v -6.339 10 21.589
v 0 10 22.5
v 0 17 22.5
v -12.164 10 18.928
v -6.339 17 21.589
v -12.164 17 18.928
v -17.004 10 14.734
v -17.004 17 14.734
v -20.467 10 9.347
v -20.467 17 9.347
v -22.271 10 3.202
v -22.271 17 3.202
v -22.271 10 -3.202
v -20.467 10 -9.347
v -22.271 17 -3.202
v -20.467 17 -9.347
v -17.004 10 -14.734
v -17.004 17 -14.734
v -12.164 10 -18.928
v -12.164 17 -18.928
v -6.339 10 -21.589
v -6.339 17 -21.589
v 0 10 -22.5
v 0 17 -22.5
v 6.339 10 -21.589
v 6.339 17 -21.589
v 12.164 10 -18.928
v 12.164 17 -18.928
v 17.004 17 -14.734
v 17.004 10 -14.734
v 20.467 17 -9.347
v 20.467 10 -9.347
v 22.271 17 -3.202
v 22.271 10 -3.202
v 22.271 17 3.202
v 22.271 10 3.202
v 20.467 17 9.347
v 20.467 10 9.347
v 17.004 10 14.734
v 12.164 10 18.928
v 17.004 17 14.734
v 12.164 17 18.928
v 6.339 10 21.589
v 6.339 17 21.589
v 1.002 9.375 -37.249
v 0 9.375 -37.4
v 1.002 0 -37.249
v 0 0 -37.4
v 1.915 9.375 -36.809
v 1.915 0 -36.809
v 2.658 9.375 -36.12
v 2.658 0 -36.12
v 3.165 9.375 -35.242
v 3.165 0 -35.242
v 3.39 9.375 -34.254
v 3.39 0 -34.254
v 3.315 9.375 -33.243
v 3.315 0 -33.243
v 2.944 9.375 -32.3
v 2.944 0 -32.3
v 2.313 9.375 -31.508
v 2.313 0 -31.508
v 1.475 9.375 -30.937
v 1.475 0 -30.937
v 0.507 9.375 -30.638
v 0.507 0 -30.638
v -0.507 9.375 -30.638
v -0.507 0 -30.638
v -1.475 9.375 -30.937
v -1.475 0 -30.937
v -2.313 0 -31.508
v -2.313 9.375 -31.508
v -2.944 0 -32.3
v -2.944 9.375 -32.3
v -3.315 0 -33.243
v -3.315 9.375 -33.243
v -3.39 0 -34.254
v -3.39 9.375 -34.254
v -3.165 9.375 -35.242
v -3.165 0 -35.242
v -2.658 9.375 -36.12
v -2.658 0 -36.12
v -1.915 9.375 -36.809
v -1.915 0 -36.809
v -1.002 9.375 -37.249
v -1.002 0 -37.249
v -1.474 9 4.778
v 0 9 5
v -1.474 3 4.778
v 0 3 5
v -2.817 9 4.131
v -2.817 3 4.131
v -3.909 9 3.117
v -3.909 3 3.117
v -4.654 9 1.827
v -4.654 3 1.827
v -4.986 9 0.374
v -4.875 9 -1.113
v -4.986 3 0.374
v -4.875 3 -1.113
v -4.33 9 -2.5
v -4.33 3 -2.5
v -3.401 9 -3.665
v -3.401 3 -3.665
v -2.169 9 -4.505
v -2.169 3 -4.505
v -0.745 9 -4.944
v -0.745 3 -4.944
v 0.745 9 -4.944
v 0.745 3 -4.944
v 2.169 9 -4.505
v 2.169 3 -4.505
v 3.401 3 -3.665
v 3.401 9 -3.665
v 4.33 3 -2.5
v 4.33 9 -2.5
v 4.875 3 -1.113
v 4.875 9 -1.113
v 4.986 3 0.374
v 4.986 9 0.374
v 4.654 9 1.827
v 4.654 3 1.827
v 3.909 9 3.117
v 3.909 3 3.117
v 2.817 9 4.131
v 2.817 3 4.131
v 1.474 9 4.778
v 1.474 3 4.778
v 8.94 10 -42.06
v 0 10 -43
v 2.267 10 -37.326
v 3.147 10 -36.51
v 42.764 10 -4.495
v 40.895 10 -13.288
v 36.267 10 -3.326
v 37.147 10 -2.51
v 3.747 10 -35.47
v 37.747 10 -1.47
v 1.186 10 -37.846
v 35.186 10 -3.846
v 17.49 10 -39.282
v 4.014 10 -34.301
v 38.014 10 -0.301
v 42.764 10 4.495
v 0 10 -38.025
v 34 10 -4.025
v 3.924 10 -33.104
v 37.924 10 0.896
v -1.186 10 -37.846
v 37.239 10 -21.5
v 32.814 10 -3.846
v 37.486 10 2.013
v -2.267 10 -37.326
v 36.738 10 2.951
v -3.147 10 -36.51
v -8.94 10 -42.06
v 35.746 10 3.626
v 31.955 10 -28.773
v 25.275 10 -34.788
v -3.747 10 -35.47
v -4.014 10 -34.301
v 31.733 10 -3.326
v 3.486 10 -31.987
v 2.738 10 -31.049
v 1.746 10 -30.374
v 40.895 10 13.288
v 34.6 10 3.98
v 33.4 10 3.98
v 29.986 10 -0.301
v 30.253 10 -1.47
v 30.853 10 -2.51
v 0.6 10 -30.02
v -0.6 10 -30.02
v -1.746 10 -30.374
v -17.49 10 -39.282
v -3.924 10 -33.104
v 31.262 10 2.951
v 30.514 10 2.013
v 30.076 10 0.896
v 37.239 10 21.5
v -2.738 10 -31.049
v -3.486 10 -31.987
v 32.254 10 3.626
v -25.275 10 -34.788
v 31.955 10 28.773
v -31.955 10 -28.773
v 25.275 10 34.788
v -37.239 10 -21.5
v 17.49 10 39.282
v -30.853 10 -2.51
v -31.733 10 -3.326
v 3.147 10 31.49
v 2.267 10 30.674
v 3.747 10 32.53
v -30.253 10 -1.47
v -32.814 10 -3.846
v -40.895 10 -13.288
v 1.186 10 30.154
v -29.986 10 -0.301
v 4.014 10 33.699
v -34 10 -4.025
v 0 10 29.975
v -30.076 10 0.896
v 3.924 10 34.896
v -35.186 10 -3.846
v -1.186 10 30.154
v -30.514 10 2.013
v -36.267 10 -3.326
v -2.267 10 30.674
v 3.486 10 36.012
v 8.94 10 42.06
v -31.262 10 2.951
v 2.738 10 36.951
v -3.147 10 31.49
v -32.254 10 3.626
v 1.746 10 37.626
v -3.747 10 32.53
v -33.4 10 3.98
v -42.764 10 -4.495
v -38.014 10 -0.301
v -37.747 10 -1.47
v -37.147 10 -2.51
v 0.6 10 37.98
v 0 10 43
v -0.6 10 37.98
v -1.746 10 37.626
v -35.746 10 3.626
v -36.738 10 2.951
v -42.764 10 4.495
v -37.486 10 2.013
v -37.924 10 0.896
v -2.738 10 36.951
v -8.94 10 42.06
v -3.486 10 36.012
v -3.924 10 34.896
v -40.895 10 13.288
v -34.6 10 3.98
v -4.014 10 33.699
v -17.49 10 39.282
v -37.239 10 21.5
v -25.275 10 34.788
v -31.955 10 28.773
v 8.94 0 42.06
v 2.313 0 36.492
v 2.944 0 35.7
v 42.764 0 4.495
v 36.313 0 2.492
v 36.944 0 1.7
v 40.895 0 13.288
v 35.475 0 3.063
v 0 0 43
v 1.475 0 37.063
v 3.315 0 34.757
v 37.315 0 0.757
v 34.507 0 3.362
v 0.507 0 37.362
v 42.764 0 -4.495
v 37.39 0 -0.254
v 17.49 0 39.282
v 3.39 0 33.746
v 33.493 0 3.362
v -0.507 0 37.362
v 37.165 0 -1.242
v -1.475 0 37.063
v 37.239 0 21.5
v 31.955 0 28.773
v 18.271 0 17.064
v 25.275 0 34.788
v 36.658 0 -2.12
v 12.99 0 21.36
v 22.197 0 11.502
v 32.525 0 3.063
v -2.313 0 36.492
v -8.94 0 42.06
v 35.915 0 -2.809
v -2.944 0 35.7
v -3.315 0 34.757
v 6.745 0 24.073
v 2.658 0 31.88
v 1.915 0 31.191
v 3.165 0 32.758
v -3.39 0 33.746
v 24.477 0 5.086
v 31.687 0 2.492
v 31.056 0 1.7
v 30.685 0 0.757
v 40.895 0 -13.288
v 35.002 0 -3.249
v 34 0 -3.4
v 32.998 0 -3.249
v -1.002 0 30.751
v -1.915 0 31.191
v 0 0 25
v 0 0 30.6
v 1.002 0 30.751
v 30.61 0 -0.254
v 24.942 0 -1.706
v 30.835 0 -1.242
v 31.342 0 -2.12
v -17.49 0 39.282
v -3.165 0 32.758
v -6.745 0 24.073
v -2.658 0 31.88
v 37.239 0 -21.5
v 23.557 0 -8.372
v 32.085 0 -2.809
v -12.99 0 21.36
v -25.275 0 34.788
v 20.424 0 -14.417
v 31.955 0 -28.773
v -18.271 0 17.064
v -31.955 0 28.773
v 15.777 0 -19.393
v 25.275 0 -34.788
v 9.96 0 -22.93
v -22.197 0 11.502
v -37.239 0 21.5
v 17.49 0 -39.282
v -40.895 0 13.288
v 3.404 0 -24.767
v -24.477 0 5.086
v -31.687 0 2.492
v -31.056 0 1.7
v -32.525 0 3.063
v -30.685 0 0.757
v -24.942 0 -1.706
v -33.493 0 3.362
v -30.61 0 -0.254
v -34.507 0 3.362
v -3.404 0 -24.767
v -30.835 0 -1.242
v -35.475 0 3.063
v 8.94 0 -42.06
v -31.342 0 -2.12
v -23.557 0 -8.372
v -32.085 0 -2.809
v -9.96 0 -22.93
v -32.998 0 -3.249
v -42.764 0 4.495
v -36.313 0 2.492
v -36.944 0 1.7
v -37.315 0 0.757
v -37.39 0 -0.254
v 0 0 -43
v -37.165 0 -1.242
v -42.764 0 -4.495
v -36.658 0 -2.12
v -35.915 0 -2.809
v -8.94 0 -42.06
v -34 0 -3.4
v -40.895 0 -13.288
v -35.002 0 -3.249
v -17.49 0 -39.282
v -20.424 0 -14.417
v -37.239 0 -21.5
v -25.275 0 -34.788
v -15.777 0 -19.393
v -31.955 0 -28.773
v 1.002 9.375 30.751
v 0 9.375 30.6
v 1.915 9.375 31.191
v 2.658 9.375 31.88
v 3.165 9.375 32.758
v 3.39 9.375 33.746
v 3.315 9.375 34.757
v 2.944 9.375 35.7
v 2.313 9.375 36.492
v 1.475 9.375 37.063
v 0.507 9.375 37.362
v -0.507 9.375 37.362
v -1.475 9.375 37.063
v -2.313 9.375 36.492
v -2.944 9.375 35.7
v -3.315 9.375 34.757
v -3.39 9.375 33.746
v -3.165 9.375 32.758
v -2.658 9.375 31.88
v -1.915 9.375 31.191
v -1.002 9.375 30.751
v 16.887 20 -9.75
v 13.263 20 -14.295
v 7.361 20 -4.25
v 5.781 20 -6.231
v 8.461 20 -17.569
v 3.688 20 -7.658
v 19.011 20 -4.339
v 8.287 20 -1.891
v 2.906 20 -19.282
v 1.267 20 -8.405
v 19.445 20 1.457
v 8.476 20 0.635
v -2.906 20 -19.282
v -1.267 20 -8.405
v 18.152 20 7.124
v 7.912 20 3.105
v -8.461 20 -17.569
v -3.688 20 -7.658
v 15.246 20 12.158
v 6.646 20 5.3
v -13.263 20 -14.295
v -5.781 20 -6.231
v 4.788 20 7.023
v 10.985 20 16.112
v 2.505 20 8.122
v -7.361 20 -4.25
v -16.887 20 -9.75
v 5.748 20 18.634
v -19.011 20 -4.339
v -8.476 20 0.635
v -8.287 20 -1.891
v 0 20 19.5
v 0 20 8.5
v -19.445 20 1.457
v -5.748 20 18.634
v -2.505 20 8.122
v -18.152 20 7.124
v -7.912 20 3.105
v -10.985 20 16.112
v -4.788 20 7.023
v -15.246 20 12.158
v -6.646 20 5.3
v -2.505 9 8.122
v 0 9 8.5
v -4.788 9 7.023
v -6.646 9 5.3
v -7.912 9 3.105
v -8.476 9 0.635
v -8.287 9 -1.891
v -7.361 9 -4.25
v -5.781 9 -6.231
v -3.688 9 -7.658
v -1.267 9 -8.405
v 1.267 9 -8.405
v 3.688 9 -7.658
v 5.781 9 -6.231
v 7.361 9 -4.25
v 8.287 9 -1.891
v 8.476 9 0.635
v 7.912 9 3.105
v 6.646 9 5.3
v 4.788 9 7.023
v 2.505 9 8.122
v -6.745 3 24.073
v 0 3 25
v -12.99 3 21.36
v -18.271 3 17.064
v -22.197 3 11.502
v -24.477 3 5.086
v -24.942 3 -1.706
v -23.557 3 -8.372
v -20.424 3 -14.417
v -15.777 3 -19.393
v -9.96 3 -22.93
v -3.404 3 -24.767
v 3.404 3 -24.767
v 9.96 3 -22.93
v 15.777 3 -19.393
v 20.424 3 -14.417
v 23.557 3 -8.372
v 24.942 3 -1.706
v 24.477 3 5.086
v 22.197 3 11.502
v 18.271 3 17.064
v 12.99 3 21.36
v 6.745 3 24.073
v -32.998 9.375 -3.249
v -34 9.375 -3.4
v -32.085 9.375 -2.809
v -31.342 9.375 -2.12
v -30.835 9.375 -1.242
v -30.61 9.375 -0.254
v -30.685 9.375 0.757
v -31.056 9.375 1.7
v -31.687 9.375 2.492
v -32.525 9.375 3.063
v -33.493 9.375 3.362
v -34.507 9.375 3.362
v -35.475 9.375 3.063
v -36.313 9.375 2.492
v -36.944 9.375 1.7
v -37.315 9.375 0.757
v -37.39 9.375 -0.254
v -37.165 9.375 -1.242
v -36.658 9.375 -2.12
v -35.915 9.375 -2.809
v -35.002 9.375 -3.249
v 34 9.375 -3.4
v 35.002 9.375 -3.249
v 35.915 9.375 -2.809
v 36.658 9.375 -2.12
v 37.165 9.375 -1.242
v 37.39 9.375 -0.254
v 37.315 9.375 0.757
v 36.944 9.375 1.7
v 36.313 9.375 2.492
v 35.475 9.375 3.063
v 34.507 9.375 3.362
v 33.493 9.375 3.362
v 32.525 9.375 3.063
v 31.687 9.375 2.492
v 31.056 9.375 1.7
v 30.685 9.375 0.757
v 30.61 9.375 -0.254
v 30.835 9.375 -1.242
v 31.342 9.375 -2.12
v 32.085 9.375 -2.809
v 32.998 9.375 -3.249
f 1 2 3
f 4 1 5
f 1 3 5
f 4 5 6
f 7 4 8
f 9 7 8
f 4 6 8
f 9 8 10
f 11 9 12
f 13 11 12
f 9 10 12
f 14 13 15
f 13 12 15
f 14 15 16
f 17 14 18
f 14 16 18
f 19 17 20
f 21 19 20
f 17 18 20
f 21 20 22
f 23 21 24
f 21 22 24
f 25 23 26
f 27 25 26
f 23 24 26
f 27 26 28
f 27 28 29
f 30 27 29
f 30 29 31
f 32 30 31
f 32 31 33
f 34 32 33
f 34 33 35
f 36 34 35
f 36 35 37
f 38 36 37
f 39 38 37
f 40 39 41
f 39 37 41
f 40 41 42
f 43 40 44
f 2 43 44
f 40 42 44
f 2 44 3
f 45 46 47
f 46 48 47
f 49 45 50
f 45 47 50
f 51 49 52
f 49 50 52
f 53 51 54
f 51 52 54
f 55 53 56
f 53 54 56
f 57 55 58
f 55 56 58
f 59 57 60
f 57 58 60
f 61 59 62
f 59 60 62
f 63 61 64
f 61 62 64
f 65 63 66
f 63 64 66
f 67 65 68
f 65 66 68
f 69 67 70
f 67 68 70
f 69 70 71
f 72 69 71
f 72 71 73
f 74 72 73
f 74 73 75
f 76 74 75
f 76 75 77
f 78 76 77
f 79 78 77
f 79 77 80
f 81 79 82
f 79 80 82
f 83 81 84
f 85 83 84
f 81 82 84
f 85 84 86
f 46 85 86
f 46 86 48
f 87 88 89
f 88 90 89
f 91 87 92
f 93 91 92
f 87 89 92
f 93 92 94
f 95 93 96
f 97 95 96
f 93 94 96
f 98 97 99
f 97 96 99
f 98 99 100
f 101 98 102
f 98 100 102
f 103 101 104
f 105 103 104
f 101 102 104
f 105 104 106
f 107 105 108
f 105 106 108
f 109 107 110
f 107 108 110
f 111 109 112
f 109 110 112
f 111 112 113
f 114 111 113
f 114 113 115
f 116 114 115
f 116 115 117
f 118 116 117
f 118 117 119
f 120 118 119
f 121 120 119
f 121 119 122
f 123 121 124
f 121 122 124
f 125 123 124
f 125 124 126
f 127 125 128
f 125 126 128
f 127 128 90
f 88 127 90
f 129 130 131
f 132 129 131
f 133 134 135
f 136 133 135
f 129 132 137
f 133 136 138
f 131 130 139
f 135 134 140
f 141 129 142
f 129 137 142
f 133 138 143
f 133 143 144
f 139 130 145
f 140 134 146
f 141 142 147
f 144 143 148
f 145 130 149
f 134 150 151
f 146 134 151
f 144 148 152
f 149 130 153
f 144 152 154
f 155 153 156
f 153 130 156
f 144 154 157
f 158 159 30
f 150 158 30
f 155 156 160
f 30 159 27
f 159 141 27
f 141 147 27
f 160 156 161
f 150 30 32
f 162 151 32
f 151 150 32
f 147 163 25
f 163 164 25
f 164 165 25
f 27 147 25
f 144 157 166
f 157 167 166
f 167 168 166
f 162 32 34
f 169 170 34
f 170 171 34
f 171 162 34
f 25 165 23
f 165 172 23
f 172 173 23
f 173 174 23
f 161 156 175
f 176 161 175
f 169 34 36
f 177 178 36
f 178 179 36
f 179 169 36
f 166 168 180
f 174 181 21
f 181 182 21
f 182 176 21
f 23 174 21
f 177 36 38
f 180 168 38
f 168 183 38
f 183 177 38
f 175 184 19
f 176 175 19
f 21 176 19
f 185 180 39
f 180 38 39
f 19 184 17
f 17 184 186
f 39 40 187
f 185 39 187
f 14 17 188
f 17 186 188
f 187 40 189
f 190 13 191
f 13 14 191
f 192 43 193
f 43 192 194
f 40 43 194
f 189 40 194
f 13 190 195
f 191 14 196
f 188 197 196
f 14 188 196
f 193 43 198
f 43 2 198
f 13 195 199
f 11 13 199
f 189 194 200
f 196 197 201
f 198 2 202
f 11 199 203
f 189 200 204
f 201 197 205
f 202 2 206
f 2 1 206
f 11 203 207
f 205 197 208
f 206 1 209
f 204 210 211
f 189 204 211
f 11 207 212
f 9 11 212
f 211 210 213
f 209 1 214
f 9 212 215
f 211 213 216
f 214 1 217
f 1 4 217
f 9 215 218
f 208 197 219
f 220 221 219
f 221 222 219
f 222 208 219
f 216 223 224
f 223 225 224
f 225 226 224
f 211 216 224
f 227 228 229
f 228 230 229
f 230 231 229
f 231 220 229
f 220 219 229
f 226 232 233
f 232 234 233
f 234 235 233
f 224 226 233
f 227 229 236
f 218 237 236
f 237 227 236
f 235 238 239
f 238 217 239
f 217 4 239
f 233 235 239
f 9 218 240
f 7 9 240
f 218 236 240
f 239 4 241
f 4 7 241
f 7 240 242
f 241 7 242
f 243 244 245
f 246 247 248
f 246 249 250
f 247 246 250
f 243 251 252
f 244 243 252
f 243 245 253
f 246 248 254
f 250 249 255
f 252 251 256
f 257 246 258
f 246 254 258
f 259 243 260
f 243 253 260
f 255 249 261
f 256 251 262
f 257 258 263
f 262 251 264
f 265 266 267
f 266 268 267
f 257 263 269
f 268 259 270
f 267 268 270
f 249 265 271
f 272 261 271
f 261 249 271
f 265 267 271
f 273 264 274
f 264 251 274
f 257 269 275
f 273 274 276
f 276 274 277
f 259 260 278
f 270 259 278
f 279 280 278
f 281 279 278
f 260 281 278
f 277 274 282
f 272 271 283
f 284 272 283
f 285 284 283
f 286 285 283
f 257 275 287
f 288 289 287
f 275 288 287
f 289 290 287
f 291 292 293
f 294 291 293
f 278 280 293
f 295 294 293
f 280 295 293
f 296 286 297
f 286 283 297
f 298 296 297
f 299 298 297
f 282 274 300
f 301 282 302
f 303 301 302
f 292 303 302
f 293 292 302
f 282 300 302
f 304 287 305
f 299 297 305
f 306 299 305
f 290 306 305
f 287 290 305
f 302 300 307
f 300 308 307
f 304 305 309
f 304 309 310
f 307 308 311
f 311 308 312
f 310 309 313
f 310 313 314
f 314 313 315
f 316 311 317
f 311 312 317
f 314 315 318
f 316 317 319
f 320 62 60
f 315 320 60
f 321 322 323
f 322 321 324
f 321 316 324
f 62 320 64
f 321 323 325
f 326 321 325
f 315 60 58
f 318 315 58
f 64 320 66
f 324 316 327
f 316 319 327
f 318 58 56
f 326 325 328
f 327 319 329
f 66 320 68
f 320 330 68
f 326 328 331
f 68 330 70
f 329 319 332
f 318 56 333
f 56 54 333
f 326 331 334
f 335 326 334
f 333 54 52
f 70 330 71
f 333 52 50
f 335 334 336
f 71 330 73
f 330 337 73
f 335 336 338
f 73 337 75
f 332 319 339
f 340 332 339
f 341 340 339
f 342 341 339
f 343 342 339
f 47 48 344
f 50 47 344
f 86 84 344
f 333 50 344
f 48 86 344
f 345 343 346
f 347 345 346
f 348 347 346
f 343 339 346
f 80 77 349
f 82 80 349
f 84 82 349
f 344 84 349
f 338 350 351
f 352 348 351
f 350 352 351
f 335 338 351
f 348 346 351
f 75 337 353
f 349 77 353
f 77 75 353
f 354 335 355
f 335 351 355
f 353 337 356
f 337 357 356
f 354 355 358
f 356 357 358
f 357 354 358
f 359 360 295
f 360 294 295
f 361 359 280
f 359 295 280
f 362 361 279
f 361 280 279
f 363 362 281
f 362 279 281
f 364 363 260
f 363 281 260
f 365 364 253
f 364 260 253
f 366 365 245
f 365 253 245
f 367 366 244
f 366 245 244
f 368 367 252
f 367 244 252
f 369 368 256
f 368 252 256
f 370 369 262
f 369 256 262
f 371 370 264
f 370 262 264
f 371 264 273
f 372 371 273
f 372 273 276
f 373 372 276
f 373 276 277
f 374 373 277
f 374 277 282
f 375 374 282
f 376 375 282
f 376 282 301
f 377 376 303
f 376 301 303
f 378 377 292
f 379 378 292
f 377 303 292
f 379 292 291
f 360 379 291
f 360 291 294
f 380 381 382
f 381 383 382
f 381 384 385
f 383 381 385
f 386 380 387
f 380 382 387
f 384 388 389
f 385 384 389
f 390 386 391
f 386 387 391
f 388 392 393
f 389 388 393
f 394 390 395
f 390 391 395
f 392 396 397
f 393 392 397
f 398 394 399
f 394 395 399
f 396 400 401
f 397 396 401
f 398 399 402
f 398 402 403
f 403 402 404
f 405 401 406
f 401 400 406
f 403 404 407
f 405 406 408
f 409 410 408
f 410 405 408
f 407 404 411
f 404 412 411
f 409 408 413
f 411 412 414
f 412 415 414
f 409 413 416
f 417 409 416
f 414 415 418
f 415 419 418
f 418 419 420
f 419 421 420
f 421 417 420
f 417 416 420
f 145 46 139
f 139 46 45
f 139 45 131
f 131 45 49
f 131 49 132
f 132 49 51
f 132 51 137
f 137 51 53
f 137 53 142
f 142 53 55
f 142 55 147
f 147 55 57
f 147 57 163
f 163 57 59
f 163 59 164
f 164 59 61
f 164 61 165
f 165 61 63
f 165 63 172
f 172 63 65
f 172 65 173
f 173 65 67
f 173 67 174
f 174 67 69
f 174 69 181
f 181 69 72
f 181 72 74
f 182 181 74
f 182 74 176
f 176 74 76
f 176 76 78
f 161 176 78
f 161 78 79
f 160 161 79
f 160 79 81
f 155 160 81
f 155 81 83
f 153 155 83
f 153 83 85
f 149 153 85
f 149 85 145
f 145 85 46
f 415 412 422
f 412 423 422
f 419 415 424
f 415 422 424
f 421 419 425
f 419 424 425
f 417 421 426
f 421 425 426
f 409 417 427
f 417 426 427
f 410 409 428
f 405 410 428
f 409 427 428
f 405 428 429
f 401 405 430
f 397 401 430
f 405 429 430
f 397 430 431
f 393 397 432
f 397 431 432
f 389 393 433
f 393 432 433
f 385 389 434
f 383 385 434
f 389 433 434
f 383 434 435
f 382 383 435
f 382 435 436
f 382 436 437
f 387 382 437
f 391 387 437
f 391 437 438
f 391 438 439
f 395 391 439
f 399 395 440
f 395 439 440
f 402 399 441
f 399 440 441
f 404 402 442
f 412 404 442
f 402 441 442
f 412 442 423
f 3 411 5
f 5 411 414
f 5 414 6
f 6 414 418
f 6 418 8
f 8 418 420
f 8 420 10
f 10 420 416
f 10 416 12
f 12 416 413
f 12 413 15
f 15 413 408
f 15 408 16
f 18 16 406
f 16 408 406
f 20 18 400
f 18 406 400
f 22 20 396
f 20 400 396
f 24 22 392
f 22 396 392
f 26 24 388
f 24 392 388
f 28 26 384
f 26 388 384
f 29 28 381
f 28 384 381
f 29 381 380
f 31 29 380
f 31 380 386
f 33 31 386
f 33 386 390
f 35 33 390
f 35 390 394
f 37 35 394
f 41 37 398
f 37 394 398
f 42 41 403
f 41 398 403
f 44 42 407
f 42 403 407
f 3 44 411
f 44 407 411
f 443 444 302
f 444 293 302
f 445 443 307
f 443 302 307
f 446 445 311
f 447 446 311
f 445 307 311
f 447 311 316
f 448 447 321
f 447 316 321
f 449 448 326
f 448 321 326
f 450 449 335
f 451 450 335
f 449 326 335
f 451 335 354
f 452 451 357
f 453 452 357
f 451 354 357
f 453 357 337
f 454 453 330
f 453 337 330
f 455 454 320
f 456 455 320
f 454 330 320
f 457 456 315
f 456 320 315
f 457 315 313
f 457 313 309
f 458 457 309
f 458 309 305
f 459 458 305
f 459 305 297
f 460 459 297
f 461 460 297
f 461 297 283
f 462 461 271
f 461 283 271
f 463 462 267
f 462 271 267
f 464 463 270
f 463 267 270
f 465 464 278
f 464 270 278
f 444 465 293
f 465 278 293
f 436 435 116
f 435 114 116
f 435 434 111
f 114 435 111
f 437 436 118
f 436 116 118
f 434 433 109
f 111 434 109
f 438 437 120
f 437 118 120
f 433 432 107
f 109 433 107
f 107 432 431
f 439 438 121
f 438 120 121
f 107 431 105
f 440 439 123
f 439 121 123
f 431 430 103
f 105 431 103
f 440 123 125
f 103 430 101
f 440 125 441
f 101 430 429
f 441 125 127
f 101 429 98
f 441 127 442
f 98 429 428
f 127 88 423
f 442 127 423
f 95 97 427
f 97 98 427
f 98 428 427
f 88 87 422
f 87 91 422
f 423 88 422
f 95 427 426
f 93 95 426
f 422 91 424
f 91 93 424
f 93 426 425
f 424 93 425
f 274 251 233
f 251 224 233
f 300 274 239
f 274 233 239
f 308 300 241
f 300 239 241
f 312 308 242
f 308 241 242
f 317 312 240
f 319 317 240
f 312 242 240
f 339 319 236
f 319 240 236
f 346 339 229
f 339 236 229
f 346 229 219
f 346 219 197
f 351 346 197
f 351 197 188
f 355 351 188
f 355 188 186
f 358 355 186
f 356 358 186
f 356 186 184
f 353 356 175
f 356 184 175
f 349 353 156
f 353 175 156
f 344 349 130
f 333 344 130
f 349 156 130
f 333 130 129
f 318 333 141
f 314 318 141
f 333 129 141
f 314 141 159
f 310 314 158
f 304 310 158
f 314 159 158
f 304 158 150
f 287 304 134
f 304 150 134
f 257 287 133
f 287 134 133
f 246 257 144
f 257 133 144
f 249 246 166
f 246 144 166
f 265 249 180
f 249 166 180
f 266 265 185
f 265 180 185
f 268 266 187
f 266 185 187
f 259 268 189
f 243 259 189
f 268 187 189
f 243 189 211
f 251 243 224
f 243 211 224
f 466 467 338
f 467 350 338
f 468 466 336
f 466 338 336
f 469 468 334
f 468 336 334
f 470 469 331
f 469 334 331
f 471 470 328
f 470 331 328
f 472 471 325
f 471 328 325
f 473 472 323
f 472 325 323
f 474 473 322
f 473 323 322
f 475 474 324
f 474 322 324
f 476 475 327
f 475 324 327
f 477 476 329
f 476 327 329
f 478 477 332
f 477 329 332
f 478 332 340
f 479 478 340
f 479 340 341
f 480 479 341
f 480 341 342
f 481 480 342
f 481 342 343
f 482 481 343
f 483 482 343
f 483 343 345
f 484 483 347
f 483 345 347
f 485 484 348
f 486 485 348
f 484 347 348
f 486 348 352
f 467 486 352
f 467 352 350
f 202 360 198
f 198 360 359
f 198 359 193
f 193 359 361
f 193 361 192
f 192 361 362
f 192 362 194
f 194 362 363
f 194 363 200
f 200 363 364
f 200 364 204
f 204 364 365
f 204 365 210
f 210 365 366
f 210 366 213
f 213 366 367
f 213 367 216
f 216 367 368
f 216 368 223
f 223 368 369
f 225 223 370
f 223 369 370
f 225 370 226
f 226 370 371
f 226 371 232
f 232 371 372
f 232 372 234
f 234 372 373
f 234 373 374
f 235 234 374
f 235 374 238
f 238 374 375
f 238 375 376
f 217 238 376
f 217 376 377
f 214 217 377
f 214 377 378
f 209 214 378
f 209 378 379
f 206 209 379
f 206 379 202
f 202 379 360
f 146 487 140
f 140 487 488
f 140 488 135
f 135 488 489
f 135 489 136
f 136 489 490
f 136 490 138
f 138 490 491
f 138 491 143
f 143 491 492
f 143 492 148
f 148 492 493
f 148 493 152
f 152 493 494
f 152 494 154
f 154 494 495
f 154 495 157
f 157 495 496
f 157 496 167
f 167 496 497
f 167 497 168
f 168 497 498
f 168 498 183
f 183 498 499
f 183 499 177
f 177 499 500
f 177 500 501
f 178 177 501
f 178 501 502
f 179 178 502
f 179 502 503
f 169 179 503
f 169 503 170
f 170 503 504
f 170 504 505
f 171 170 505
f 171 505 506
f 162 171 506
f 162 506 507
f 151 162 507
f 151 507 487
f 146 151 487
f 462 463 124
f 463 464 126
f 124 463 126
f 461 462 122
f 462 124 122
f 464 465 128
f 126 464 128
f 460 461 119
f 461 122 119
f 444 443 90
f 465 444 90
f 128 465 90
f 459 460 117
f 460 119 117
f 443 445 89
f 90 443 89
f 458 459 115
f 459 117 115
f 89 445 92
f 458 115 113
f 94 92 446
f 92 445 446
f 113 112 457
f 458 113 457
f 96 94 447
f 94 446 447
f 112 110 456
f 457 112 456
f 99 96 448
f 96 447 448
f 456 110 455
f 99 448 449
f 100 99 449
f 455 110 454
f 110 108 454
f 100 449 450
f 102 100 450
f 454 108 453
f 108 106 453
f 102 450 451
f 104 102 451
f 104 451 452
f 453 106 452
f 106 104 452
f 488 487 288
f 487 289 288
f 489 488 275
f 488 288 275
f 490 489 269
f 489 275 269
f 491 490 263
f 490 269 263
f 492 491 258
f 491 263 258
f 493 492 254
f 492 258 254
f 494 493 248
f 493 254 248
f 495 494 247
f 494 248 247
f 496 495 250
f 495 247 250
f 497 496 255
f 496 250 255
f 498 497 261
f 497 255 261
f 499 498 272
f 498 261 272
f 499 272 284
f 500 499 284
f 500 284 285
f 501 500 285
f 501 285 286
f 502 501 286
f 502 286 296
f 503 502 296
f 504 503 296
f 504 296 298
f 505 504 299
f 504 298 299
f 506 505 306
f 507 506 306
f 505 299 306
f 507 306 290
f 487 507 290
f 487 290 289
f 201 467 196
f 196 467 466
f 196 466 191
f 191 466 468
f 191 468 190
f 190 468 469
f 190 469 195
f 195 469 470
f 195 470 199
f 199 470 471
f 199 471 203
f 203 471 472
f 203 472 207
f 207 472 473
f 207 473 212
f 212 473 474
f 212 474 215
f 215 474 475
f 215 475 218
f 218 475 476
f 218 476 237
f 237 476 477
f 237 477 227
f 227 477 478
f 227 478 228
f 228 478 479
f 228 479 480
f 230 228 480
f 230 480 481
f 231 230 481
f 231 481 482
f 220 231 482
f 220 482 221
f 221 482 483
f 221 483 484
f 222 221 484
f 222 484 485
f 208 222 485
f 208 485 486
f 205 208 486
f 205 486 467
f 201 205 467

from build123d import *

# Parameters (mm, degrees)
SKETCH3_R                   = 2.5
CUT_EXTRUDE1_DEPTH          = 10
CHAMFER1_SIZE               = 3
M8_TAPPED_HOLE1_D           = 6.8
M8_TAPPED_HOLE1_DEPTH       = 19.75
M8_TAPPED_HOLE1_CSINK_D     = 8.05
M8_TAPPED_HOLE1_CSINK_ANGLE = 90
M8_TAPPED_HOLE1_TIP         = 2.042926105


with BuildPart() as part:
    # Sketch1 → Revolve1 (revolve)
    with BuildSketch(Plane.XY, mode=Mode.PRIVATE) as revolve1_sk:
        Polygon((43, 0), (43, 10), (22.5, 10), (22.5, 20), (8.5, 20), (8.5, 9), (5, 9), (5, 3), (25, 3), (25, 0), align=None)
    revolve(revolve1_sk.sketch.rotate(Axis((0, 0, 0), (0, -1, 0)), 90), axis=Axis((0, 0, 0), (0, -1, 0)))

    # Sketch3 → Cut-Extrude1 (cut)
    with BuildSketch(Plane(origin=(0, 10, 0), x_dir=(1, 0, 0), z_dir=(0, 1, 0))):
        with Locations(Location((34, 0, 0), (0, 0, 270))):
            Circle(SKETCH3_R)
        with Locations(Location((0, -34, 0), (0, 0, 270))):
            Circle(SKETCH3_R)
        with Locations(Location((-34, 0, 0), (0, 0, 270))):
            Circle(SKETCH3_R)
        with Locations(Location((0, 34, 0), (0, 0, 270))):
            Circle(SKETCH3_R)
    extrude(amount=-CUT_EXTRUDE1_DEPTH, mode=Mode.SUBTRACT)

    # Chamfer1
    chamfer1_edges = [part.edges().sort_by_distance(p)[0] for p in [
        (0, 20, -22.5),
    ]]
    chamfer(chamfer1_edges, length=CHAMFER1_SIZE)

    # M8 Tapped Hole1
    with Locations(Plane(origin=(0, 10, -34), x_dir=(0, 0, 1), z_dir=(0, 1, 0))):
        with Locations((0, 0), (34, 34), (68, 0), (34, -34)):
            CounterSinkHole(M8_TAPPED_HOLE1_D / 2, M8_TAPPED_HOLE1_CSINK_D / 2, depth=M8_TAPPED_HOLE1_DEPTH, counter_sink_angle=M8_TAPPED_HOLE1_CSINK_ANGLE)
            with Locations((0, 0, -(M8_TAPPED_HOLE1_DEPTH + M8_TAPPED_HOLE1_TIP / 2))):  # 118° drill point
                Cone(0, M8_TAPPED_HOLE1_D / 2, M8_TAPPED_HOLE1_TIP, mode=Mode.SUBTRACT)


solid = part.part
